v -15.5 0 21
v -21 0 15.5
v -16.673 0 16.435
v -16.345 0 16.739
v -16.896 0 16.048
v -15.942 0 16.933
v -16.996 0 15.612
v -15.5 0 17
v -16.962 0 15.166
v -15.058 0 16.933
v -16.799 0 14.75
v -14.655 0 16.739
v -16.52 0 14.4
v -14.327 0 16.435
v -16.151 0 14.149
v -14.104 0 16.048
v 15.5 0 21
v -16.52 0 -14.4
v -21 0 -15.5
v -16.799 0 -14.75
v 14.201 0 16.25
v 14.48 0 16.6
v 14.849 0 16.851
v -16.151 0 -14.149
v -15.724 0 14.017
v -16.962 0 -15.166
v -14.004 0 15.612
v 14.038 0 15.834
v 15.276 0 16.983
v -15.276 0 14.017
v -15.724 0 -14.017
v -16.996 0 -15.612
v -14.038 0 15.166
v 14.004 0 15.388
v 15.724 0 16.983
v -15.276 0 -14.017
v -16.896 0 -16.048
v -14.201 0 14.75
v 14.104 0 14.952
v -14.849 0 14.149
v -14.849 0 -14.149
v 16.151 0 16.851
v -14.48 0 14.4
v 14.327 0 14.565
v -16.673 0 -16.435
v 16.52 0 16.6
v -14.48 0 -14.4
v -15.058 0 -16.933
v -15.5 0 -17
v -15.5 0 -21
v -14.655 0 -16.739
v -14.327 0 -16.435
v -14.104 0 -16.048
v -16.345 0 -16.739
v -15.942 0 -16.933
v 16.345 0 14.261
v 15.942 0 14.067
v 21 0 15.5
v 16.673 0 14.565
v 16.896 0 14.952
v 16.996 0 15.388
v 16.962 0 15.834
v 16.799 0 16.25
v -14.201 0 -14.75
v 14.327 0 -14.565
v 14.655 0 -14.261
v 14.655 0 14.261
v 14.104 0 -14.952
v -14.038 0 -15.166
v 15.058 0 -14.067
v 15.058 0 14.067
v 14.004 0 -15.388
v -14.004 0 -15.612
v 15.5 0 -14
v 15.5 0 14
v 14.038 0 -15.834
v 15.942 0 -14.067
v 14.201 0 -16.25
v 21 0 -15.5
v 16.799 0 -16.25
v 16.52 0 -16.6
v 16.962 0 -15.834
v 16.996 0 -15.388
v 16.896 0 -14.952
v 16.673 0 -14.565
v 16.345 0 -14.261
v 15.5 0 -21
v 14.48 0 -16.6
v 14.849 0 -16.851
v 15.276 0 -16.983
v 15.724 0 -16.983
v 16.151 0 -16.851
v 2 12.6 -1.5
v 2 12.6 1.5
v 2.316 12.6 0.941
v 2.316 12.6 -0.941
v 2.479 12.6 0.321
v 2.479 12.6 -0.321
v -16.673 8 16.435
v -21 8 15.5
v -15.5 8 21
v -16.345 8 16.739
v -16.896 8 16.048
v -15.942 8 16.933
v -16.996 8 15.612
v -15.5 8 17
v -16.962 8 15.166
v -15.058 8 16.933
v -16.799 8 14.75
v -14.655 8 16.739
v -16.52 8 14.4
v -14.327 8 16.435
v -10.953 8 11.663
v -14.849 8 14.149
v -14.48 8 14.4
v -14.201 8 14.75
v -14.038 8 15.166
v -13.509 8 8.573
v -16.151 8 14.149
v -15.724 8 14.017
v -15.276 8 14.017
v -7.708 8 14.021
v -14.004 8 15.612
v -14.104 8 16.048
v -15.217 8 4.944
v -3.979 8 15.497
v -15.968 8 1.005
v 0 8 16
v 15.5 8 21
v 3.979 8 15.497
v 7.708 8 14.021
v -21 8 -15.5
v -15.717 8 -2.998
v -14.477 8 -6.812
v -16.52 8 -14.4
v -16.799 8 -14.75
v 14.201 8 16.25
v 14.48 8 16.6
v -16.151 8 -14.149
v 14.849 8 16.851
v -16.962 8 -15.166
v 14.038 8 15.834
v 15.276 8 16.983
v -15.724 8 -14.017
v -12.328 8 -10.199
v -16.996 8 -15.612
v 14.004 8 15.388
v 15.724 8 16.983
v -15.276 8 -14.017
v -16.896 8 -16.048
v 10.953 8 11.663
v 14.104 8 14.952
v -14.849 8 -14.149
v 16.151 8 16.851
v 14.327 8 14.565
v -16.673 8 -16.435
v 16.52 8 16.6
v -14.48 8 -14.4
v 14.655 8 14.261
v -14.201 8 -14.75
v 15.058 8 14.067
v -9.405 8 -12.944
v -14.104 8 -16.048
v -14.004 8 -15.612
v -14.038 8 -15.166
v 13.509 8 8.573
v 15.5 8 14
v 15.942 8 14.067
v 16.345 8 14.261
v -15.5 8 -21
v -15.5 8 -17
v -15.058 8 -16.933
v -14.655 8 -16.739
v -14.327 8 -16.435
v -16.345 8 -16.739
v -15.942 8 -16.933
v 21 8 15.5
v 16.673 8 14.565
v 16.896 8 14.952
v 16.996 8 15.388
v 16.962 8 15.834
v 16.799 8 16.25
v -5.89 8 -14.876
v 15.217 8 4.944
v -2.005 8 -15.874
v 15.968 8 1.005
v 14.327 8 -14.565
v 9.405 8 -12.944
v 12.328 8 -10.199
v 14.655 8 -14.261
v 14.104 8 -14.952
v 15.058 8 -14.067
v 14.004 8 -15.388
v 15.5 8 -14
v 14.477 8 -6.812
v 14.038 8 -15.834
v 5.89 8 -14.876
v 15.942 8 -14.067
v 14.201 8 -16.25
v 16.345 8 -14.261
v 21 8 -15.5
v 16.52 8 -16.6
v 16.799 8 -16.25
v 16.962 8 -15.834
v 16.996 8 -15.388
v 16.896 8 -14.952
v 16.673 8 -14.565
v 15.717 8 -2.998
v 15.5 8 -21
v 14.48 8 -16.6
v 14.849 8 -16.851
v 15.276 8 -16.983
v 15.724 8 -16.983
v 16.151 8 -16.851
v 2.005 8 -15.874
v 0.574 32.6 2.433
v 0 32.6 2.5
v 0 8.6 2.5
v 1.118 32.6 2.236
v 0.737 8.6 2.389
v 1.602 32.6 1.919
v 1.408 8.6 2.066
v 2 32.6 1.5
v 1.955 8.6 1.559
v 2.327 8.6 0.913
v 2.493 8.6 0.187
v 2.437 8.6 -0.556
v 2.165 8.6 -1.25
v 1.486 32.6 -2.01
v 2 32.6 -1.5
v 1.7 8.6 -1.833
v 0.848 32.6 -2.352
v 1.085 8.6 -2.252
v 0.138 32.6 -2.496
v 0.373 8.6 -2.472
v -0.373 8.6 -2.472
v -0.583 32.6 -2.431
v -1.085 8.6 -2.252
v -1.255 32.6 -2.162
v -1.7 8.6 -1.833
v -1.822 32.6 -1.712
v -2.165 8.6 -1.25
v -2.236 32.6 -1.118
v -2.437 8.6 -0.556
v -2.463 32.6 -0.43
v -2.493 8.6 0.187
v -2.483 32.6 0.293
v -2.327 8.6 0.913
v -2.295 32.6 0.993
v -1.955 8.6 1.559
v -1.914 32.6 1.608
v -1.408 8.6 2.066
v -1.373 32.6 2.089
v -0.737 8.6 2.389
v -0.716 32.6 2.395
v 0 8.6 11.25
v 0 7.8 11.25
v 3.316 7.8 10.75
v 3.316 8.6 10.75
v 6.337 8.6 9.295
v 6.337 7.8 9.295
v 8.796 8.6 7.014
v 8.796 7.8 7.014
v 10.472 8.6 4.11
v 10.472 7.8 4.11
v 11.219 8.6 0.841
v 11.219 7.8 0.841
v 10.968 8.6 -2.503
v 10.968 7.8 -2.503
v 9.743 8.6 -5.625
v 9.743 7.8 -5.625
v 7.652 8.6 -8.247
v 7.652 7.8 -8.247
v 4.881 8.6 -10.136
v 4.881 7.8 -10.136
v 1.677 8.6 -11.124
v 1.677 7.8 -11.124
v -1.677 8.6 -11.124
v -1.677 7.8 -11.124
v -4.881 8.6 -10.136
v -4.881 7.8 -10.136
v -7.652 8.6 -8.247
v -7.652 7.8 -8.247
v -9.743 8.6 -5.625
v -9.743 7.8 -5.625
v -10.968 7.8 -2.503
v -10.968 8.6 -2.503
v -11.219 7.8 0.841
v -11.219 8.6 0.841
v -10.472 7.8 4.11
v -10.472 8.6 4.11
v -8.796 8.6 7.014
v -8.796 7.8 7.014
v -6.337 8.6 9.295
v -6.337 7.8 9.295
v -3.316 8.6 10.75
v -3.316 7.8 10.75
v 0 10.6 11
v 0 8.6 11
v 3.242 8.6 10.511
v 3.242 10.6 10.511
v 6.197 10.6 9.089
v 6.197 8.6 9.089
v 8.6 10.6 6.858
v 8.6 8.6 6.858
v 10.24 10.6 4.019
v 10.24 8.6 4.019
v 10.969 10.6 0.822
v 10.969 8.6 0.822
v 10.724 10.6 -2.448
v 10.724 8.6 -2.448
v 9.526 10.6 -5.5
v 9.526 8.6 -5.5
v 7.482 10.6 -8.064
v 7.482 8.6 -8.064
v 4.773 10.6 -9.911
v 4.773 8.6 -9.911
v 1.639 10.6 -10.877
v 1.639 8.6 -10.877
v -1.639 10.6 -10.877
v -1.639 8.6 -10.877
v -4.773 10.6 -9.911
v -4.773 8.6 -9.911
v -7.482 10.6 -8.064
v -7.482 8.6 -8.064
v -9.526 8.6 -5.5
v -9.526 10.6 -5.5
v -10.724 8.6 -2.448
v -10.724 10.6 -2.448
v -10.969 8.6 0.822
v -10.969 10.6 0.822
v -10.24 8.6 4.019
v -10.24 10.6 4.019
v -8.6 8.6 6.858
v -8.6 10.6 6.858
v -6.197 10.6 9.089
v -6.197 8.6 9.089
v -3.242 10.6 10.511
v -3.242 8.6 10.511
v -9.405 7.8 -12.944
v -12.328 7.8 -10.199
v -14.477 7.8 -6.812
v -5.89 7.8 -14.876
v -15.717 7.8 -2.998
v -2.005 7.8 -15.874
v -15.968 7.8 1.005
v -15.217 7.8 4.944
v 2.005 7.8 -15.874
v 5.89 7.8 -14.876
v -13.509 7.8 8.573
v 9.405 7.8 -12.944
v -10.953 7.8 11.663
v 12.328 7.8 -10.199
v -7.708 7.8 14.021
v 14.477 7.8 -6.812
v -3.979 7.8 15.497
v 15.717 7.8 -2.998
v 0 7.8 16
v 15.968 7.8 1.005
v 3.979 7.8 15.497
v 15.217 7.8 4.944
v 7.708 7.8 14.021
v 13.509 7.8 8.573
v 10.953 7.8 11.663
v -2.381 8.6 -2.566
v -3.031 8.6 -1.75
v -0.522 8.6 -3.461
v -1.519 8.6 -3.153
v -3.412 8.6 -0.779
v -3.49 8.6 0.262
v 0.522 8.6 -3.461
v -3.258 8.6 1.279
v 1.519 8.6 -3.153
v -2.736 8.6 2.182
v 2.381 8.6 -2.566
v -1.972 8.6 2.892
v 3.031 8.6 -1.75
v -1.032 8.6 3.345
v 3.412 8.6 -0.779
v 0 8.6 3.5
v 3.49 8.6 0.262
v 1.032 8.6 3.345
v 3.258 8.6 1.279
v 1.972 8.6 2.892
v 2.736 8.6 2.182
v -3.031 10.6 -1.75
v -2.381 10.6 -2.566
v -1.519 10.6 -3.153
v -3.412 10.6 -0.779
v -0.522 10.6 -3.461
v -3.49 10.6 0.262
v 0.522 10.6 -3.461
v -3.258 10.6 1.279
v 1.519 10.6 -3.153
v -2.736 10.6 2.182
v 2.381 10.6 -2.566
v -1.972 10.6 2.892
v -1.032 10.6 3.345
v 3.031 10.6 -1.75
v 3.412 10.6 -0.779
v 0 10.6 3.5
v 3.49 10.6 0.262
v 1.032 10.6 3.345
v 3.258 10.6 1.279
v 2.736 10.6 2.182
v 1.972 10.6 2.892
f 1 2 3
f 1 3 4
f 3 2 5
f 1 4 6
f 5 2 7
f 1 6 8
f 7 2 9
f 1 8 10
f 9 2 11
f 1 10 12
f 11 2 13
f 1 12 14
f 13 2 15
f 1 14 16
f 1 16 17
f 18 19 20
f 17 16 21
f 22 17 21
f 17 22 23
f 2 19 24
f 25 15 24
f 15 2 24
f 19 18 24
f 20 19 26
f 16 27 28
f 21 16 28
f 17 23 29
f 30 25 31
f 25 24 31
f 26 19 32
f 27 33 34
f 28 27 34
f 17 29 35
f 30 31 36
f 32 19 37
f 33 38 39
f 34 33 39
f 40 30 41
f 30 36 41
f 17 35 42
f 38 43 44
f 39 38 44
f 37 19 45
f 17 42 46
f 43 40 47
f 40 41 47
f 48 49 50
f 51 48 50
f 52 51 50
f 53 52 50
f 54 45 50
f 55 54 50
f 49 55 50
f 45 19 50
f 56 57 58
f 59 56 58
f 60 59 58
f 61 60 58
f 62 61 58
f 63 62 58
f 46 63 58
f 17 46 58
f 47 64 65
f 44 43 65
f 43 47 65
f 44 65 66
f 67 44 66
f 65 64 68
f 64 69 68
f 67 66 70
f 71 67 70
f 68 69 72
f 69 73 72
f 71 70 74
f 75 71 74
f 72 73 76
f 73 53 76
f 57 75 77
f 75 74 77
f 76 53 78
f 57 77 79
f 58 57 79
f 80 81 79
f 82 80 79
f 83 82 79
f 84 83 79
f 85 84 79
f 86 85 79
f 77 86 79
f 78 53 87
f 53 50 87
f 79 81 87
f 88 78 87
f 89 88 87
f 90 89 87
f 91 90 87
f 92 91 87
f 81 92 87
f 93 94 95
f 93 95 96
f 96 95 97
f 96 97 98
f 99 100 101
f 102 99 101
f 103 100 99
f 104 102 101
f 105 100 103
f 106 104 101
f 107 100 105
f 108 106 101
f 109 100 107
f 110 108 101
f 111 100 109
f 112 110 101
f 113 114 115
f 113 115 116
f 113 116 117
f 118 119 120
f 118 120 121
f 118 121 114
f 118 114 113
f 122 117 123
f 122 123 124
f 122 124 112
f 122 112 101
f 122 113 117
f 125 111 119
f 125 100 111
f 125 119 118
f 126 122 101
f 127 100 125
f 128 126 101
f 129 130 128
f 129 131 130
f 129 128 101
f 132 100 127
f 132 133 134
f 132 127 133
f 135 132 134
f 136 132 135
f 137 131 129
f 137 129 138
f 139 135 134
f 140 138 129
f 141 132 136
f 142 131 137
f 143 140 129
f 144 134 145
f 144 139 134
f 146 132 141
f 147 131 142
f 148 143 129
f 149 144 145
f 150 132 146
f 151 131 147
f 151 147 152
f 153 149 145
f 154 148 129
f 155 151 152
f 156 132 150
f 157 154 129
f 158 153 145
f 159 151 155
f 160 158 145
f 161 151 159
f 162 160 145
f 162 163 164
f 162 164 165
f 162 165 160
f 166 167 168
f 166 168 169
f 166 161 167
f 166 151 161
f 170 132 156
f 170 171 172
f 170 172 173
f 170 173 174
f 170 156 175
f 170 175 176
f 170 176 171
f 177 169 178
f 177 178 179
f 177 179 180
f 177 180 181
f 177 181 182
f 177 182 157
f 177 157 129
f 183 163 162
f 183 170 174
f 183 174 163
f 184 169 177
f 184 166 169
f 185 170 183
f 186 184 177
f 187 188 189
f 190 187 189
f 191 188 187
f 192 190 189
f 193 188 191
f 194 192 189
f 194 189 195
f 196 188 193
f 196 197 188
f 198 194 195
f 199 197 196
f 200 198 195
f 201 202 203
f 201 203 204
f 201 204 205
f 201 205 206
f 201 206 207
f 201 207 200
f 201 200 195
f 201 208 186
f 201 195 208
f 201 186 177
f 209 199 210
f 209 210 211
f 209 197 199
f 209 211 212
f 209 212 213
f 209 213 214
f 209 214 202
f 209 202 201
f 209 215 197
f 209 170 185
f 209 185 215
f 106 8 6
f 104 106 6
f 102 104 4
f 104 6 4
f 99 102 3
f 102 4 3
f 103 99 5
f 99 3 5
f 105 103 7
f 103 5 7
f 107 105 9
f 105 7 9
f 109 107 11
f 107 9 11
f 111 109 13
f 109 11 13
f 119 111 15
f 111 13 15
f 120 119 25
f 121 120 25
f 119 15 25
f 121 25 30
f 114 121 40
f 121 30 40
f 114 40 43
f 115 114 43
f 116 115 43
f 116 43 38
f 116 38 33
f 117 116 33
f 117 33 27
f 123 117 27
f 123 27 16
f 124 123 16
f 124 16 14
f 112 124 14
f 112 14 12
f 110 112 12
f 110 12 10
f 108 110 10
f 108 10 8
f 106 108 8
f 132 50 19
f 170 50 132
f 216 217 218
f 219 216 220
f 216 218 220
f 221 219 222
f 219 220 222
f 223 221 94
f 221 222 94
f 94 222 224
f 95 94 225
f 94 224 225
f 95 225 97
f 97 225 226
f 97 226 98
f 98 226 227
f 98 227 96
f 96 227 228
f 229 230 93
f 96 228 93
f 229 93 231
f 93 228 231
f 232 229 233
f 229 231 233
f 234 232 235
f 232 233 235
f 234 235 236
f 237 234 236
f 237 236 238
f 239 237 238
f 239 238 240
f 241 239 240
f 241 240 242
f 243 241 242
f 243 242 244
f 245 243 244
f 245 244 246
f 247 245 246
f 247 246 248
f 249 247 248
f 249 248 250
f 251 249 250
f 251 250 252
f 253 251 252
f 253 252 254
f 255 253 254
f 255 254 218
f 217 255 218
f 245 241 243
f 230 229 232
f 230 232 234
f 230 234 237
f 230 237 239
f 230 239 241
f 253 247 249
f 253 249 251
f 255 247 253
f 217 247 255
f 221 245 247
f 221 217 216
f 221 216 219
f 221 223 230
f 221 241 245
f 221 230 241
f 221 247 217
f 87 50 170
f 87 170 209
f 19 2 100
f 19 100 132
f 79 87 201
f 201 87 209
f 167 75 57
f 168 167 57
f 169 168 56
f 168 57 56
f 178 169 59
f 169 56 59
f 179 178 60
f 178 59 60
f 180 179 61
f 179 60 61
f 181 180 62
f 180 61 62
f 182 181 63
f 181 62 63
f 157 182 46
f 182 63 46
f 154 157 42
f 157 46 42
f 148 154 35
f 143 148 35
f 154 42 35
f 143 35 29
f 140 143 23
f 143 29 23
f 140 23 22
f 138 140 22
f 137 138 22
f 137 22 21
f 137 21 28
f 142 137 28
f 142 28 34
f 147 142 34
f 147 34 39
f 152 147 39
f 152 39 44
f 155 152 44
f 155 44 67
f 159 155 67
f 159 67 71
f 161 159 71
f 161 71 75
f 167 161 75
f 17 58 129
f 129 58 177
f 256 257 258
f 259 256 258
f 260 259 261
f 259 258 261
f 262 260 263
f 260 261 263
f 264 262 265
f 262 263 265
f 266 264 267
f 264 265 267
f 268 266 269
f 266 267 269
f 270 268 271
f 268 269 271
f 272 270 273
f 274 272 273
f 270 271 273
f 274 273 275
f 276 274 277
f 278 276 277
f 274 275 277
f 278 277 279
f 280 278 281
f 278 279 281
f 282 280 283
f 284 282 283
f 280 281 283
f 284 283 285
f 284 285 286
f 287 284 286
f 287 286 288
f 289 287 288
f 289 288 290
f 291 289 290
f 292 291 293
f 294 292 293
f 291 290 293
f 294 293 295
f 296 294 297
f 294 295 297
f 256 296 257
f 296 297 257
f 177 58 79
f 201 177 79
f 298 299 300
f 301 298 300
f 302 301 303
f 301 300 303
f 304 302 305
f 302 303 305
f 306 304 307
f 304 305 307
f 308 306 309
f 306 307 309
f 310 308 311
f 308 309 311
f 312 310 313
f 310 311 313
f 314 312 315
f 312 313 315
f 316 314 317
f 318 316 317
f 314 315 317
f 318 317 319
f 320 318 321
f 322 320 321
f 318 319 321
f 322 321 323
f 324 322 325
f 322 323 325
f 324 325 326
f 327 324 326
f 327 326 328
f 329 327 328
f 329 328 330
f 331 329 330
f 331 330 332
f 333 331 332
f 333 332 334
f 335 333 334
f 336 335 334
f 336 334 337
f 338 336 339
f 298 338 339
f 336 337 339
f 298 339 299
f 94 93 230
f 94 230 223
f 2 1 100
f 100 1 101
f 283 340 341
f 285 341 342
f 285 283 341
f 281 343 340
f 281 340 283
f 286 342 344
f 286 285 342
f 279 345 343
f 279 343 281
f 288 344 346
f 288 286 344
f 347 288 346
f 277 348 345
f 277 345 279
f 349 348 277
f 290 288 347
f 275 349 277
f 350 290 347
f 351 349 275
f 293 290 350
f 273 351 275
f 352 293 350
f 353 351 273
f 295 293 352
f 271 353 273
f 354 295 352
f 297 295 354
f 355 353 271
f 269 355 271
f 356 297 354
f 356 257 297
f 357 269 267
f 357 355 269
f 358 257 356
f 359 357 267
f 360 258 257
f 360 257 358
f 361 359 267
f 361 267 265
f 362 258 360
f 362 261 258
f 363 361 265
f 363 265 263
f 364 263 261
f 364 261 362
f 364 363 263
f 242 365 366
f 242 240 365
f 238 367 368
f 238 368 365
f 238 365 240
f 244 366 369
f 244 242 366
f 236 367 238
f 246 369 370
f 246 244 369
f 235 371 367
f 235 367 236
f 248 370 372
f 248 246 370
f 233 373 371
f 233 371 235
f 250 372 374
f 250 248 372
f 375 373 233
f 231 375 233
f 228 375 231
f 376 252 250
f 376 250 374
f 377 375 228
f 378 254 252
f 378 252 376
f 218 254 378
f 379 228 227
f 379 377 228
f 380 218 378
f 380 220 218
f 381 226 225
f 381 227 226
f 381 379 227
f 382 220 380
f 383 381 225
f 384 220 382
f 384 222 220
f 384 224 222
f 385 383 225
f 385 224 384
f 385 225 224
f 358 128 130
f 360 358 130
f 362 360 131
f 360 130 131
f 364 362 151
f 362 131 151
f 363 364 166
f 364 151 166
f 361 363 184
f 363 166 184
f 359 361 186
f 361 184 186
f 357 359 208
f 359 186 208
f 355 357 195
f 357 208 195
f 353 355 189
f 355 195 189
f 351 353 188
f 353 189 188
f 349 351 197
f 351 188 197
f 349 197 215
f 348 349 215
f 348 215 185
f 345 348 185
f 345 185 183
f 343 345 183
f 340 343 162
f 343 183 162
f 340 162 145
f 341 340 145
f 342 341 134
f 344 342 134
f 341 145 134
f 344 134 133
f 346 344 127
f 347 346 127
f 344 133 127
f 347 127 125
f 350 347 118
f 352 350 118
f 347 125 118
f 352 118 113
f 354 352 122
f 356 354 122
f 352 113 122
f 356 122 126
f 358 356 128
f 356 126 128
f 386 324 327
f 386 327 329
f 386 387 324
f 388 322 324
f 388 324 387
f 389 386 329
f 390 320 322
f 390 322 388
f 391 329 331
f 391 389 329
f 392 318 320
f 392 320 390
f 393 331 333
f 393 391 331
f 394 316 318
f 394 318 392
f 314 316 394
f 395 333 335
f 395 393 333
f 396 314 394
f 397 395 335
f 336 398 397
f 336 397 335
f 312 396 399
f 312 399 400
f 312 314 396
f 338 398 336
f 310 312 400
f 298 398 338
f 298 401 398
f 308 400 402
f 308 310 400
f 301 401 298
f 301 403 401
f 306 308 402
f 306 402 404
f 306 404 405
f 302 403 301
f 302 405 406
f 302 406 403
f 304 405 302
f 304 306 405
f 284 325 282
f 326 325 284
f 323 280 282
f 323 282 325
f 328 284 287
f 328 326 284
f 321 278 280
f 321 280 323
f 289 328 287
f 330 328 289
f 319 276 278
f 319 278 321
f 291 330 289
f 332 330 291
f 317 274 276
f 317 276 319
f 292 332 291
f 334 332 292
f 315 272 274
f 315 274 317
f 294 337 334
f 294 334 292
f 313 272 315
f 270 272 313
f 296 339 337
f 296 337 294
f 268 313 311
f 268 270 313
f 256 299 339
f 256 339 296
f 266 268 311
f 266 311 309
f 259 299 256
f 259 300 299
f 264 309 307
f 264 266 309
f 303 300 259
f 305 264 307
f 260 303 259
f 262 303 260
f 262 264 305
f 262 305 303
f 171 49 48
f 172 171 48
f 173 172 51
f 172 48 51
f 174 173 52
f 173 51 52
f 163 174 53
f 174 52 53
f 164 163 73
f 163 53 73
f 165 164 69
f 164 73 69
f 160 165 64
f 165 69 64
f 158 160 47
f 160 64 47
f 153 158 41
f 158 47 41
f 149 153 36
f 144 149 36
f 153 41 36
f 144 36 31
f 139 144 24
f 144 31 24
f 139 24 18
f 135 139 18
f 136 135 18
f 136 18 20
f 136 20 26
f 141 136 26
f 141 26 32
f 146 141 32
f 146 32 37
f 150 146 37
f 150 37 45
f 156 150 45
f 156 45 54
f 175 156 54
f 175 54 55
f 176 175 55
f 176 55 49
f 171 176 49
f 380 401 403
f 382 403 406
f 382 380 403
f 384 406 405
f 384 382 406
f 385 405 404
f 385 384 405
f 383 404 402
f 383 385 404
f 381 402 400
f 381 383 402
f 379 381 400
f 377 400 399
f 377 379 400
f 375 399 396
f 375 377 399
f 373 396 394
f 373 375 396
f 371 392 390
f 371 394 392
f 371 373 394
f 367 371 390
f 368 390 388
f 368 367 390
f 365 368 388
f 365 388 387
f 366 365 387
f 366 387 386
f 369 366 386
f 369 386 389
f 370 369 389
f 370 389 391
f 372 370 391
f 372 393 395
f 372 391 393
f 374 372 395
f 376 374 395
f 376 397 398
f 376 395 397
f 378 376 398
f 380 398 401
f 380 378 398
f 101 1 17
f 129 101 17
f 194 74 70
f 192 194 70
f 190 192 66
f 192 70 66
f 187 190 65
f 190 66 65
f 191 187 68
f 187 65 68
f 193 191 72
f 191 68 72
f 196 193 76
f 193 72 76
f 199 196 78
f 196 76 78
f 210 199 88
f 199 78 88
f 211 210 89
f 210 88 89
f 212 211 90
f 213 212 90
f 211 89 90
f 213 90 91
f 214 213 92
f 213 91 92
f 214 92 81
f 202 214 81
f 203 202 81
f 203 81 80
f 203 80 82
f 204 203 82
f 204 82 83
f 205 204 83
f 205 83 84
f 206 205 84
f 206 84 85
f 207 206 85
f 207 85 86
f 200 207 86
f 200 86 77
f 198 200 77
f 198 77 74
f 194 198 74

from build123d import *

# Parameters (mm, degrees)
SKETCH1_W           = 42
SKETCH1_H           = 42
NEMA_17_DEPTH       = 8
CHAMFER1_SIZE       = 5.5
SKETCH2_R           = 1.5
M6_BOLT_HOLES_DEPTH = 31.757112998
SKETCH3_R           = 16
CUT_EXTRUDE1_DEPTH  = 0.2
SKETCH4_R           = 11.25
BOSS_EXTRUDE1_DEPTH = 0.8
SKETCH5_R           = 11
BOSS_EXTRUDE2_DEPTH = 2
SKETCH6_R           = 3.5
CUT_EXTRUDE2_DEPTH  = 31.918602814
SKETCH7_R           = 2.5
BOSS_EXTRUDE3_DEPTH = 24
CUT_EXTRUDE3_START  = -20
CUT_EXTRUDE3_DEPTH  = 20


with BuildPart() as part:
    # Sketch1 → Nema 17 (new body)
    with BuildSketch(Plane(origin=(0, 0, 0), x_dir=(1, 0, 0), z_dir=(0, 1, 0))):
        Rectangle(SKETCH1_W, SKETCH1_H)
    extrude(amount=NEMA_17_DEPTH)

    # Chamfer1
    chamfer1_edges = [part.edges().sort_by_distance(p)[0] for p in [
        (21, 4, 21),
        (-21, 4, 21),
        (-21, 4, -21),
        (21, 4, -21),
    ]]
    chamfer(chamfer1_edges, length=CHAMFER1_SIZE)

    # Sketch2 → M6 Bolt Holes (cut, through all)
    with BuildSketch(Plane.XZ):
        with Locations(Location((-15.5, -15.5, 0), (0, 0, 270))):
            Circle(SKETCH2_R)
        with Locations(Location((15.5, -15.5, 0), (0, 0, 90))):
            Circle(SKETCH2_R)
        with Locations(Location((-15.5, 15.5, 0), (0, 0, 90))):
            Circle(SKETCH2_R)
        with Locations(Location((15.5, 15.5, 0), (0, 0, 270))):
            Circle(SKETCH2_R)
    extrude(amount=-M6_BOLT_HOLES_DEPTH, mode=Mode.SUBTRACT)

    # Sketch3 → Cut-Extrude1 (cut)
    with BuildSketch(Plane(origin=(0, 8, 0), x_dir=(1, 0, 0), z_dir=(0, 1, 0))):
        with Locations(Location((0, 0, 0), (0, 0, 270))):
            Circle(SKETCH3_R)
    extrude(amount=-CUT_EXTRUDE1_DEPTH, mode=Mode.SUBTRACT)

    # Sketch4 → Boss-Extrude1 (add)
    with BuildSketch(Plane(origin=(0, 7.8, 0), x_dir=(1, 0, 0), z_dir=(0, 1, 0))):
        with Locations(Location((0, 0, 0), (0, 0, 270))):
            Circle(SKETCH4_R)
    extrude(amount=BOSS_EXTRUDE1_DEPTH)

    # Sketch5 → Boss-Extrude2 (add)
    with BuildSketch(Plane(origin=(0, 8.6, 0), x_dir=(1, 0, 0), z_dir=(0, 1, 0))):
        with Locations(Location((0, 0, 0), (0, 0, 270))):
            Circle(SKETCH5_R)
    extrude(amount=BOSS_EXTRUDE2_DEPTH)

    # Sketch6 → Cut-Extrude2 (cut, through all)
    with BuildSketch(Plane(origin=(0, 8.6, 0), x_dir=(1, 0, 0), z_dir=(0, 1, 0))):
        with Locations(Location((0, 0, 0), (0, 0, 270))):
            Circle(SKETCH6_R)
    extrude(amount=CUT_EXTRUDE2_DEPTH, mode=Mode.SUBTRACT)

    # Sketch7 → Boss-Extrude3 (add)
    with BuildSketch(Plane(origin=(0, 8.6, 0), x_dir=(1, 0, 0), z_dir=(0, 1, 0))):
        with Locations(Location((0, 0, 0), (0, 0, 270))):
            Circle(SKETCH7_R)
    extrude(amount=BOSS_EXTRUDE3_DEPTH)

    # Sketch9 → Cut-Extrude3 (cut)
    with BuildSketch(Plane(origin=(0, 32.6, 0), x_dir=(1, 0, 0), z_dir=(0, 1, 0)).offset(CUT_EXTRUDE3_START)):
        with BuildLine():
            Line((2, 1.5), (2, -1.5))
            ThreePointArc((2, -1.5), (2.5, 0), (2, 1.5))
        make_face()
    extrude(amount=CUT_EXTRUDE3_DEPTH, mode=Mode.SUBTRACT)


solid = part.part
